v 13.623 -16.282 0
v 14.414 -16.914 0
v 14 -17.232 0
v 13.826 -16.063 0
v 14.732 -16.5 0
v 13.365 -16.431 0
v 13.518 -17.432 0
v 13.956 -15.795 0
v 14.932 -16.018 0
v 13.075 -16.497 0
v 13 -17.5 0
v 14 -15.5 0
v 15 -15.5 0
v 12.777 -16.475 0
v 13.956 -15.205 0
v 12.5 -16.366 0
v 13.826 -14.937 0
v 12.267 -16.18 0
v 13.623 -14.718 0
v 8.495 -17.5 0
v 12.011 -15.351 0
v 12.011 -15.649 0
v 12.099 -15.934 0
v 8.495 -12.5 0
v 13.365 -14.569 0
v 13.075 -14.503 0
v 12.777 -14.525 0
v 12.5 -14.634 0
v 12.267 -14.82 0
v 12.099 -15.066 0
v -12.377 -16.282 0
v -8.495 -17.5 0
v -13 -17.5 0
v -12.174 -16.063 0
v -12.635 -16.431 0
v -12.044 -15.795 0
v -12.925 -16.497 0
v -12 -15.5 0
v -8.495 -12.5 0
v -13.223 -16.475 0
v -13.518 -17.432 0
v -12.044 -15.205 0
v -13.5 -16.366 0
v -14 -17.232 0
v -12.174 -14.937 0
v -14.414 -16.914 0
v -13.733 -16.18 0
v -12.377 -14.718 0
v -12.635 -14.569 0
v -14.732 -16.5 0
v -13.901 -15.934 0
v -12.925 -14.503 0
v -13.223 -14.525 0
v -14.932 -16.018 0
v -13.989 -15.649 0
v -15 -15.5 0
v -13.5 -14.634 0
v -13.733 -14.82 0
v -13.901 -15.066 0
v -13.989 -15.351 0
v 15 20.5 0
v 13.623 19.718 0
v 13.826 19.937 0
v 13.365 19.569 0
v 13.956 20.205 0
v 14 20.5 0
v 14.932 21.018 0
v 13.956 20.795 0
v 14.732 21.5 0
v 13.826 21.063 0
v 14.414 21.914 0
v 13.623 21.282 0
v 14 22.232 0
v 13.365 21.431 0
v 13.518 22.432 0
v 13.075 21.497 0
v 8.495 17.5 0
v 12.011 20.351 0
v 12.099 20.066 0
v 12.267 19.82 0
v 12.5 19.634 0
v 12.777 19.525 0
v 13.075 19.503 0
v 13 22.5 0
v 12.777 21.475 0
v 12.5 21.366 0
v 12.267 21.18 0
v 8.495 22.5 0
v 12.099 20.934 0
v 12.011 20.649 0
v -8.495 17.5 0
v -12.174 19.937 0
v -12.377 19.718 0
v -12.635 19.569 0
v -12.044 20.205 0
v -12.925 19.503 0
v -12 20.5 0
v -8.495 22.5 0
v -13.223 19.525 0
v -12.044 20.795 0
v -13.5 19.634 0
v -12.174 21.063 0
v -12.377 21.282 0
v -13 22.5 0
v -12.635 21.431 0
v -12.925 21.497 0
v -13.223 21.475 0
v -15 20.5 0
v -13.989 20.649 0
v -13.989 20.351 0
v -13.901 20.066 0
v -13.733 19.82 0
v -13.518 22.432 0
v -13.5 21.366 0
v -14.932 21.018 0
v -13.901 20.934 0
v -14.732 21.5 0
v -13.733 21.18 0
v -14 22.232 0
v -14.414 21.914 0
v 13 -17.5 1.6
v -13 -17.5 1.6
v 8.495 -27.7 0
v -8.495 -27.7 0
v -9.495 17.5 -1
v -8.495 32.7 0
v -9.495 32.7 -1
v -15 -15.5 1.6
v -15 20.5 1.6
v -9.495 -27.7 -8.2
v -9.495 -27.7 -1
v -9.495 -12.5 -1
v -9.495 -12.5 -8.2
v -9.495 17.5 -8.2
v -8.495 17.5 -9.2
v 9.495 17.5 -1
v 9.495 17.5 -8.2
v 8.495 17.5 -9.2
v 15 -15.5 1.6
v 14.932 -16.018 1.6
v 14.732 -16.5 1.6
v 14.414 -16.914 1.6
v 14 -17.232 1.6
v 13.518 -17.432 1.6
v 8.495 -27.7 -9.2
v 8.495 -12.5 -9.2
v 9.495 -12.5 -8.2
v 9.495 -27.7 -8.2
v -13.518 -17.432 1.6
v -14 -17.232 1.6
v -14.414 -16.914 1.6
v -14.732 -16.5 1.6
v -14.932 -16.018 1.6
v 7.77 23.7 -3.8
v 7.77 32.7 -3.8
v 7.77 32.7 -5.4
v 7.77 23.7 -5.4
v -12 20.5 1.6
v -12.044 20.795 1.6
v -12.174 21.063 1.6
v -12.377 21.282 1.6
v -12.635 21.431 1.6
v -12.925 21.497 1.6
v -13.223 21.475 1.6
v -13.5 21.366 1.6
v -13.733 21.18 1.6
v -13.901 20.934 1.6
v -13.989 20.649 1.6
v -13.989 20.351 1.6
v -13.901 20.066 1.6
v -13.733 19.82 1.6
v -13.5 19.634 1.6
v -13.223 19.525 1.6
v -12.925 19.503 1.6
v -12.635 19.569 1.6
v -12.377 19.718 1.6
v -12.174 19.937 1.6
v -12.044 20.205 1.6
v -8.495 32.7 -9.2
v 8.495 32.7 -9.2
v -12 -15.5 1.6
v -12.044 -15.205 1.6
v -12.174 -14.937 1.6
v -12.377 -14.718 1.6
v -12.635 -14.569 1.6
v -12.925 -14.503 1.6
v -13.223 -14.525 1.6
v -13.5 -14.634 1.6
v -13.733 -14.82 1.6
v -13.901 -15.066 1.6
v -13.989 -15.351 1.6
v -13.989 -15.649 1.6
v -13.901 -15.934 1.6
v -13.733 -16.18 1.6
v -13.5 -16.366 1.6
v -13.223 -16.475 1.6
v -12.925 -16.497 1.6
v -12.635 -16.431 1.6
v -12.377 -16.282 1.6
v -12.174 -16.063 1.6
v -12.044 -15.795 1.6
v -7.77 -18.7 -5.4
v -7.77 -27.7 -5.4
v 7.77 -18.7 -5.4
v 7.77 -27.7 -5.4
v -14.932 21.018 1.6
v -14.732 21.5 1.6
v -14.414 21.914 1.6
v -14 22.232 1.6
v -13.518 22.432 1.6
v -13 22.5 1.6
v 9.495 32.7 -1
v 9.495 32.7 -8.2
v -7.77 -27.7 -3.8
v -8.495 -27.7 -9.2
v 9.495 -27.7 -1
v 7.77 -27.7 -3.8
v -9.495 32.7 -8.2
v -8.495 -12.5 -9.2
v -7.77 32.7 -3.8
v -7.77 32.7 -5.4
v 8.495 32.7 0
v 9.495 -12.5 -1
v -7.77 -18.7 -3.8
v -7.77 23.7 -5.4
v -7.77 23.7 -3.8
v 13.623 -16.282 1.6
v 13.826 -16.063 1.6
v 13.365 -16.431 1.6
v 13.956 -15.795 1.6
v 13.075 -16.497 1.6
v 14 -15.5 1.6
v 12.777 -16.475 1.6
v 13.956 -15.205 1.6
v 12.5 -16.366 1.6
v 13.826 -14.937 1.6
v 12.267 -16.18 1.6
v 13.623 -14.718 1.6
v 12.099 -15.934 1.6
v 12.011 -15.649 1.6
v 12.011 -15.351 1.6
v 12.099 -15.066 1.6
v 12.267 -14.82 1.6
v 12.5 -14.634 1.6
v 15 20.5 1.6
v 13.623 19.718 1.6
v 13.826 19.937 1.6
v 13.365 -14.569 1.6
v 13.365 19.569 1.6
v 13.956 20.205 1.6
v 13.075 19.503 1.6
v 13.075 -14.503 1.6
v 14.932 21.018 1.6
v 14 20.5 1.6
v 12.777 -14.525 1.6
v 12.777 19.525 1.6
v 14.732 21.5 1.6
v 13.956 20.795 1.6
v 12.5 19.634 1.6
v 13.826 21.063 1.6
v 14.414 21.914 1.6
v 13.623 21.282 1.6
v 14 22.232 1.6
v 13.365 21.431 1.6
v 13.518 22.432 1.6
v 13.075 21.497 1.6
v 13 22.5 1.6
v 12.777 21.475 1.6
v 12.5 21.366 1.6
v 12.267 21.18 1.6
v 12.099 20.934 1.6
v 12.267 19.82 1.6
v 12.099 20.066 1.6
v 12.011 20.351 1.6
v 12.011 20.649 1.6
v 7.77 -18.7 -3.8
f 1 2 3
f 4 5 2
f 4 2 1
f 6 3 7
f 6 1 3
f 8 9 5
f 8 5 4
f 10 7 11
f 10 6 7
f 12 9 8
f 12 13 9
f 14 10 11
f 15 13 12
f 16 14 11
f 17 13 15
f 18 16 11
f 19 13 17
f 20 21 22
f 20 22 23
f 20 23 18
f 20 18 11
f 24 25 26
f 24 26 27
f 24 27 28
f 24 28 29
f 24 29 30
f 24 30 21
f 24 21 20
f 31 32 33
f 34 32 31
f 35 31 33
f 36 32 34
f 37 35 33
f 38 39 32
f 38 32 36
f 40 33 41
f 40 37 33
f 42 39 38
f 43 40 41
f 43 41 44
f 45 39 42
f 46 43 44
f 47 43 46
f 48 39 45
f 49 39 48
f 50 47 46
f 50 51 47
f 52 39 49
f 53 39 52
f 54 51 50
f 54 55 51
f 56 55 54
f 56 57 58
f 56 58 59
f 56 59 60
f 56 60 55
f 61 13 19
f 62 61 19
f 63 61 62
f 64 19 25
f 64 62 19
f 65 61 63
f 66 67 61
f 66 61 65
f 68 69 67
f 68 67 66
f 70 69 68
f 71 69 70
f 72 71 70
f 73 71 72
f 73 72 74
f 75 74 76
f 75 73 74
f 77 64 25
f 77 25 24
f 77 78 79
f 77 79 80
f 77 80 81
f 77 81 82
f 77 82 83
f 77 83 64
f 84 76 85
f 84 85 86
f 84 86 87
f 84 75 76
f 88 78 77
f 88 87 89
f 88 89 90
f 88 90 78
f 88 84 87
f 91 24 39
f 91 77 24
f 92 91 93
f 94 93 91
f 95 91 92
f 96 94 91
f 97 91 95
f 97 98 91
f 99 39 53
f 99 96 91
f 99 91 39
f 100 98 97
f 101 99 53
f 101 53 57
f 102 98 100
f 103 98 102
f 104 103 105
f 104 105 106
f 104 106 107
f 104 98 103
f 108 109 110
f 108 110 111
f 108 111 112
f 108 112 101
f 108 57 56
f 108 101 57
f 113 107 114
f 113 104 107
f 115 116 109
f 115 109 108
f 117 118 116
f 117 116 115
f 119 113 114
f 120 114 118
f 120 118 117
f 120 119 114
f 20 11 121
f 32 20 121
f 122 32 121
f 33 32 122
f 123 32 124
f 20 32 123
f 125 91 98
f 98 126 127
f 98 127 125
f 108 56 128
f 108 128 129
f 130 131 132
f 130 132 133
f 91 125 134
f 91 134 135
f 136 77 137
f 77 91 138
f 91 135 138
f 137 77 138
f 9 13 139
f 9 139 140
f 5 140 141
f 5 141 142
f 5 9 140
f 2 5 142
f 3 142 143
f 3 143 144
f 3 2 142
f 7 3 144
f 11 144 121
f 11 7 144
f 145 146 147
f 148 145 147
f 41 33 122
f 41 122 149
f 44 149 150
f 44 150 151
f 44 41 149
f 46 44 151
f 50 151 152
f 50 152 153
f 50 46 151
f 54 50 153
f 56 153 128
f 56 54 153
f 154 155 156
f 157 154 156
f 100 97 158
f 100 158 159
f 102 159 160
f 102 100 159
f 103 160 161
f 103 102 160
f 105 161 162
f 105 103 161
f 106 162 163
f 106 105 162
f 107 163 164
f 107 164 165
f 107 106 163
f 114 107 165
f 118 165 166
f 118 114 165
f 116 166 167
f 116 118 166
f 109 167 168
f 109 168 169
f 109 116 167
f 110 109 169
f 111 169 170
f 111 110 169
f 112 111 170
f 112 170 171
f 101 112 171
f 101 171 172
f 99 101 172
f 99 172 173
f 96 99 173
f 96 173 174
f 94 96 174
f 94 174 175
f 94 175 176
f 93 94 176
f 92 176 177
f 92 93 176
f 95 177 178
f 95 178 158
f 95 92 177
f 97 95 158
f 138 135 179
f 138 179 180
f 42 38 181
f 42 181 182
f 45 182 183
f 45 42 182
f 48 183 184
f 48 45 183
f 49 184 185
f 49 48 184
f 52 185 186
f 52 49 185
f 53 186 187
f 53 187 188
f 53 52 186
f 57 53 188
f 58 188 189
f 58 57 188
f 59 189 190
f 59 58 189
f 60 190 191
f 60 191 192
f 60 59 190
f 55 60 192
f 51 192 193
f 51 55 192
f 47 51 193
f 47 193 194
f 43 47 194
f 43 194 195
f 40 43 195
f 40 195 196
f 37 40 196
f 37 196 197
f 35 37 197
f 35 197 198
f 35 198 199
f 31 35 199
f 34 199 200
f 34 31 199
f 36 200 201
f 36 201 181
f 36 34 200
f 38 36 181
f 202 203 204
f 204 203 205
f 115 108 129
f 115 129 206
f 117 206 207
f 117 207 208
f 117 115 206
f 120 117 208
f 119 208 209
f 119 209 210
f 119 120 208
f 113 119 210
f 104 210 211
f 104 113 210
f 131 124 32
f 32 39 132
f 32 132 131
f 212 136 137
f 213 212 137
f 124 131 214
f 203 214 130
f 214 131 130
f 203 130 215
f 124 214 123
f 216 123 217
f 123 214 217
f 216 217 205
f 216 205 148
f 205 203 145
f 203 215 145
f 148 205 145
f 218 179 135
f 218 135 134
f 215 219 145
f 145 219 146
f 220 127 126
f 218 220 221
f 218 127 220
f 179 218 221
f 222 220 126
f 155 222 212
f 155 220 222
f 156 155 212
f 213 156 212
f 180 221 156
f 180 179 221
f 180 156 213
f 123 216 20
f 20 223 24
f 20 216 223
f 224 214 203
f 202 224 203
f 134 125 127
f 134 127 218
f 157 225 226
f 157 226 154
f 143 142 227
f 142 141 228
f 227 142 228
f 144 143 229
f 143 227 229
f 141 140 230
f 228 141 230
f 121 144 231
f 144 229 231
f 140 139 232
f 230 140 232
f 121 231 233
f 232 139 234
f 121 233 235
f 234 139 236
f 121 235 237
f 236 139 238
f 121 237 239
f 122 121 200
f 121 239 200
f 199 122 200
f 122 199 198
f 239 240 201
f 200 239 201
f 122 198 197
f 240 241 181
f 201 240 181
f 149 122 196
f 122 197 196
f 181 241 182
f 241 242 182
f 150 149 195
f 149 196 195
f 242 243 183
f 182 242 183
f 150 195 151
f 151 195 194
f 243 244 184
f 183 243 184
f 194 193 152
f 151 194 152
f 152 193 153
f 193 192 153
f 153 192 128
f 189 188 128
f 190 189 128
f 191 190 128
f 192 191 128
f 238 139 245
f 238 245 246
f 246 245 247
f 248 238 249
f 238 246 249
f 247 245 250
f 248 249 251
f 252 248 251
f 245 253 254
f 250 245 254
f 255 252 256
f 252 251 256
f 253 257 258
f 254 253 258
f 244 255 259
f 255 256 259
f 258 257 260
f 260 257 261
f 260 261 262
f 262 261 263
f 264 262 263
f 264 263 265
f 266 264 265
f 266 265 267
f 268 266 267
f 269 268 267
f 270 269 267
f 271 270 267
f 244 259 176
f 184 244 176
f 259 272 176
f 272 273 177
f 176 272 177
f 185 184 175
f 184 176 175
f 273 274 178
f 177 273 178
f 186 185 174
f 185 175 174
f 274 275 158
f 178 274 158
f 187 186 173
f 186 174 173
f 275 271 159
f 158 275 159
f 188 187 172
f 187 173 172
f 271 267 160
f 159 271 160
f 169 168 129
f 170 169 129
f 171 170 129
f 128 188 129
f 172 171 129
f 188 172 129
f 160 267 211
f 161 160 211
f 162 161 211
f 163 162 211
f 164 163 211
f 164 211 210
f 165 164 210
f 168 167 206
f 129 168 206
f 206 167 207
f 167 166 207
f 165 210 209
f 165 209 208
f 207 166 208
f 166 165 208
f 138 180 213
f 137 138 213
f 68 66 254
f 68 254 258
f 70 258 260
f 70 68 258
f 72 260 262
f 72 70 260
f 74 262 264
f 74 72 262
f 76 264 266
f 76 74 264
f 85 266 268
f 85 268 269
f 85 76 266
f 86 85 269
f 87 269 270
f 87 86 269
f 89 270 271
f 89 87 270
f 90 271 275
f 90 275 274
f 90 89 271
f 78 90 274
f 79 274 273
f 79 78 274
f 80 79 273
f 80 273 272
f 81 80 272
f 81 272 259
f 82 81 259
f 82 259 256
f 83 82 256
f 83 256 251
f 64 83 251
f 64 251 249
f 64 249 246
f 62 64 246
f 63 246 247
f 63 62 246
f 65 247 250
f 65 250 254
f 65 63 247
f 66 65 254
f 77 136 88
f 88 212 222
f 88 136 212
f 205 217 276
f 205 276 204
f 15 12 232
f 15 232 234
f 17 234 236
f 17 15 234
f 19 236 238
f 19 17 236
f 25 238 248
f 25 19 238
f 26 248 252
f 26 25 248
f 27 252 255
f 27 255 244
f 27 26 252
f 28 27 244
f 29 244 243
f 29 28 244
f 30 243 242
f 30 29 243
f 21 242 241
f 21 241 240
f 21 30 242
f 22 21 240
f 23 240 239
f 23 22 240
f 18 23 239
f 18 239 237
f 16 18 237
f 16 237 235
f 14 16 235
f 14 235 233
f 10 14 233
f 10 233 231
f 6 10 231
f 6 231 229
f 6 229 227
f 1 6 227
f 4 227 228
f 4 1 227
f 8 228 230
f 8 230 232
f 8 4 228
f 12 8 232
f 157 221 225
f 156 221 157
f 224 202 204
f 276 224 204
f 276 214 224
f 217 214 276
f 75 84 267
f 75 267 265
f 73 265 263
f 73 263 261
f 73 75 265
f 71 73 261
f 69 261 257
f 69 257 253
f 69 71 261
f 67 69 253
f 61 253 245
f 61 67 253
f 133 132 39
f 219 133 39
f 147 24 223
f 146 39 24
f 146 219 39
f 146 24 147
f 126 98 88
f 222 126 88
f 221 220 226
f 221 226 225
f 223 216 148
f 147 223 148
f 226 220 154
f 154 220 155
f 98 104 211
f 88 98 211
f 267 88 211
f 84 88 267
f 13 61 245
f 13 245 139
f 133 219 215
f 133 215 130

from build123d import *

# Parameters (mm, degrees)
SKETCH_1_R           = 1
EXTRUDE_1_DEPTH      = 1.6
SKETCH_2_W           = 16.45
SKETCH_2_H           = 15.2
SKETCH_2_W_2         = 13.91
EXTRUDE_2_DEPTH      = 9.2
CUT_EXTRUDE_START    = 32.7
CUT_EXTRUDE_1_DEPTH  = 15.2
CUT_EXTRUDE_START_2  = -27.7
CUT_EXTRUDE_2_DEPTH  = 15.2
SKETCH_6_W           = 13
SKETCH_6_H           = 1.6
CUT_EXTRUDE_3_DEPTH  = 9
SKETCH_7_W           = 10.46
SKETCH_7_H           = 1.6
CUT_EXTRUDE_8_DEPTH  = 9
EXTRUDE_START        = 17.5
SKETCH_10_W          = 18.99
SKETCH_10_H          = 9.2
EXTRUDE_5_DEPTH      = 15.2
EXTRUDE_START_2      = -12.5
SKETCH_11_W          = 18.99
SKETCH_11_H          = 9.2
EXTRUDE_6_DEPTH      = 15.2
CUT_EXTRUDE_9_DEPTH  = 60.4
SKETCH_14_W          = 15.54
SKETCH_14_H          = 1.6
CUT_EXTRUDE_10_DEPTH = 9
SKETCH_15_W          = 15.54
SKETCH_15_H          = 1.6
CUT_EXTRUDE_11_DEPTH = 9


with BuildPart() as part:
    # 草图1 → 凸台-拉伸1 (new body)
    with BuildSketch(Plane.XY):
        with BuildLine():
            Line((-13, 22.5), (13, 22.5))
            ThreePointArc((13, 22.5), (14.414213562, 21.914213562), (15, 20.5))
            Line((15, 20.5), (15, -15.5))
            ThreePointArc((15, -15.5), (14.414213562, -16.914213562), (13, -17.5))
            Line((13, -17.5), (-13, -17.5))
            ThreePointArc((-13, -17.5), (-14.414213562, -16.914213562), (-15, -15.5))
            Line((-15, -15.5), (-15, 20.5))
            ThreePointArc((-15, 20.5), (-14.414213562, 21.914213562), (-13, 22.5))
        make_face()
        with Locations((-13, 20.5)):
            Circle(SKETCH_1_R, mode=Mode.SUBTRACT)
        with Locations((13, 20.5)):
            Circle(SKETCH_1_R, mode=Mode.SUBTRACT)
        with Locations((13, -15.5)):
            Circle(SKETCH_1_R, mode=Mode.SUBTRACT)
        with Locations((-13, -15.5)):
            Circle(SKETCH_1_R, mode=Mode.SUBTRACT)
    extrude(amount=EXTRUDE_1_DEPTH)

    # 草图2 → 凸台-拉伸2 (add)
    with BuildSketch(Plane.XY):
        with Locations((0, 25.1)):
            Rectangle(SKETCH_2_W, SKETCH_2_H)
        with Locations((0, -20.1)):
            Rectangle(SKETCH_2_W_2, SKETCH_2_H)
    extrude(amount=-EXTRUDE_2_DEPTH)

    # 草图3 → 切除-拉伸1 (cut)
    with BuildSketch(Plane(origin=(0, 0, 0), x_dir=(1, 0, 0), z_dir=(0, 1, 0)).offset(CUT_EXTRUDE_START)):
        Polygon((-8.225, 9.2), (-7.225, 9.2), (-8.225, 8.2), align=None)
        Polygon((-8.225, 0), (-7.225, 0), (-8.225, 1), align=None)
        Polygon((8.225, 0), (8.225, 1), (7.225, 0), align=None)
        Polygon((8.225, 9.2), (7.225, 9.2), (8.225, 8.2), align=None)
    extrude(amount=-CUT_EXTRUDE_1_DEPTH, mode=Mode.SUBTRACT)

    # 草图4 → 切除-拉伸2 (cut)
    with BuildSketch(Plane(origin=(0, 0, 0), x_dir=(1, 0, 0), z_dir=(0, 1, 0)).offset(CUT_EXTRUDE_START_2)):
        Polygon((-6.955, 0), (-5.955, 0), (-6.955, 1), align=None)
        Polygon((-6.955, 9.2), (-6.955, 8.2), (-5.955, 9.2), align=None)
        Polygon((6.955, 0), (6.955, 1), (5.955, 0), align=None)
        Polygon((6.955, 9.2), (6.955, 8.2), (5.955, 9.2), align=None)
    extrude(amount=CUT_EXTRUDE_2_DEPTH, mode=Mode.SUBTRACT)

    # 草图6 → 切除-拉伸3 (cut)
    with BuildSketch(Plane(origin=(0, 0, 0), x_dir=(1, 0, 0), z_dir=(0, 1, 0)).offset(CUT_EXTRUDE_START)):
        with Locations((0, 4.6)):
            Rectangle(SKETCH_6_W, SKETCH_6_H)
    extrude(amount=-CUT_EXTRUDE_3_DEPTH, mode=Mode.SUBTRACT)

    # 草图7 → 切除-拉伸8 (cut)
    with BuildSketch(Plane(origin=(0, 0, 0), x_dir=(1, 0, 0), z_dir=(0, 1, 0)).offset(CUT_EXTRUDE_START_2)):
        with Locations((0, 4.6)):
            Rectangle(SKETCH_7_W, SKETCH_7_H)
    extrude(amount=CUT_EXTRUDE_8_DEPTH, mode=Mode.SUBTRACT)

    # 草图10 → 凸台-拉伸5 (add)
    with BuildSketch(Plane(origin=(0, 0, 0), x_dir=(1, 0, 0), z_dir=(0, 1, 0)).offset(EXTRUDE_START)):
        with Locations((0, 4.6)):
            Rectangle(SKETCH_10_W, SKETCH_10_H)
    extrude(amount=EXTRUDE_5_DEPTH)

    # 草图11 → 凸台-拉伸6 (add)
    with BuildSketch(Plane(origin=(0, 0, 0), x_dir=(1, 0, 0), z_dir=(0, 1, 0)).offset(EXTRUDE_START_2)):
        with Locations((0, 4.6)):
            Rectangle(SKETCH_11_W, SKETCH_11_H)
    extrude(amount=-EXTRUDE_6_DEPTH)

    # 草图12 → 切除-拉伸9 (cut)
    with BuildSketch(Plane(origin=(0, 0, 0), x_dir=(1, 0, 0), z_dir=(0, 1, 0)).offset(CUT_EXTRUDE_START)):
        Polygon((-9.495, 9.2), (-8.495, 9.2), (-9.495, 8.2), align=None)
        Polygon((-9.495, 0), (-8.495, 0), (-9.495, 1), align=None)
        Polygon((9.495, 9.2), (8.495, 9.2), (9.495, 8.2), align=None)
        Polygon((9.495, 0), (9.495, 1), (8.495, 0), align=None)
    extrude(amount=-CUT_EXTRUDE_9_DEPTH, mode=Mode.SUBTRACT)

    # 草图14 → 切除-拉伸10 (cut)
    with BuildSketch(Plane(origin=(0, 0, 0), x_dir=(1, 0, 0), z_dir=(0, 1, 0)).offset(CUT_EXTRUDE_START)):
        with Locations((0, 4.6)):
            Rectangle(SKETCH_14_W, SKETCH_14_H)
    extrude(amount=-CUT_EXTRUDE_10_DEPTH, mode=Mode.SUBTRACT)

    # 草图15 → 切除-拉伸11 (cut)
    with BuildSketch(Plane(origin=(0, 0, 0), x_dir=(1, 0, 0), z_dir=(0, 1, 0)).offset(CUT_EXTRUDE_START_2)):
        with Locations((0, 4.6)):
            Rectangle(SKETCH_15_W, SKETCH_15_H)
    extrude(amount=CUT_EXTRUDE_11_DEPTH, mode=Mode.SUBTRACT)


solid = part.part
